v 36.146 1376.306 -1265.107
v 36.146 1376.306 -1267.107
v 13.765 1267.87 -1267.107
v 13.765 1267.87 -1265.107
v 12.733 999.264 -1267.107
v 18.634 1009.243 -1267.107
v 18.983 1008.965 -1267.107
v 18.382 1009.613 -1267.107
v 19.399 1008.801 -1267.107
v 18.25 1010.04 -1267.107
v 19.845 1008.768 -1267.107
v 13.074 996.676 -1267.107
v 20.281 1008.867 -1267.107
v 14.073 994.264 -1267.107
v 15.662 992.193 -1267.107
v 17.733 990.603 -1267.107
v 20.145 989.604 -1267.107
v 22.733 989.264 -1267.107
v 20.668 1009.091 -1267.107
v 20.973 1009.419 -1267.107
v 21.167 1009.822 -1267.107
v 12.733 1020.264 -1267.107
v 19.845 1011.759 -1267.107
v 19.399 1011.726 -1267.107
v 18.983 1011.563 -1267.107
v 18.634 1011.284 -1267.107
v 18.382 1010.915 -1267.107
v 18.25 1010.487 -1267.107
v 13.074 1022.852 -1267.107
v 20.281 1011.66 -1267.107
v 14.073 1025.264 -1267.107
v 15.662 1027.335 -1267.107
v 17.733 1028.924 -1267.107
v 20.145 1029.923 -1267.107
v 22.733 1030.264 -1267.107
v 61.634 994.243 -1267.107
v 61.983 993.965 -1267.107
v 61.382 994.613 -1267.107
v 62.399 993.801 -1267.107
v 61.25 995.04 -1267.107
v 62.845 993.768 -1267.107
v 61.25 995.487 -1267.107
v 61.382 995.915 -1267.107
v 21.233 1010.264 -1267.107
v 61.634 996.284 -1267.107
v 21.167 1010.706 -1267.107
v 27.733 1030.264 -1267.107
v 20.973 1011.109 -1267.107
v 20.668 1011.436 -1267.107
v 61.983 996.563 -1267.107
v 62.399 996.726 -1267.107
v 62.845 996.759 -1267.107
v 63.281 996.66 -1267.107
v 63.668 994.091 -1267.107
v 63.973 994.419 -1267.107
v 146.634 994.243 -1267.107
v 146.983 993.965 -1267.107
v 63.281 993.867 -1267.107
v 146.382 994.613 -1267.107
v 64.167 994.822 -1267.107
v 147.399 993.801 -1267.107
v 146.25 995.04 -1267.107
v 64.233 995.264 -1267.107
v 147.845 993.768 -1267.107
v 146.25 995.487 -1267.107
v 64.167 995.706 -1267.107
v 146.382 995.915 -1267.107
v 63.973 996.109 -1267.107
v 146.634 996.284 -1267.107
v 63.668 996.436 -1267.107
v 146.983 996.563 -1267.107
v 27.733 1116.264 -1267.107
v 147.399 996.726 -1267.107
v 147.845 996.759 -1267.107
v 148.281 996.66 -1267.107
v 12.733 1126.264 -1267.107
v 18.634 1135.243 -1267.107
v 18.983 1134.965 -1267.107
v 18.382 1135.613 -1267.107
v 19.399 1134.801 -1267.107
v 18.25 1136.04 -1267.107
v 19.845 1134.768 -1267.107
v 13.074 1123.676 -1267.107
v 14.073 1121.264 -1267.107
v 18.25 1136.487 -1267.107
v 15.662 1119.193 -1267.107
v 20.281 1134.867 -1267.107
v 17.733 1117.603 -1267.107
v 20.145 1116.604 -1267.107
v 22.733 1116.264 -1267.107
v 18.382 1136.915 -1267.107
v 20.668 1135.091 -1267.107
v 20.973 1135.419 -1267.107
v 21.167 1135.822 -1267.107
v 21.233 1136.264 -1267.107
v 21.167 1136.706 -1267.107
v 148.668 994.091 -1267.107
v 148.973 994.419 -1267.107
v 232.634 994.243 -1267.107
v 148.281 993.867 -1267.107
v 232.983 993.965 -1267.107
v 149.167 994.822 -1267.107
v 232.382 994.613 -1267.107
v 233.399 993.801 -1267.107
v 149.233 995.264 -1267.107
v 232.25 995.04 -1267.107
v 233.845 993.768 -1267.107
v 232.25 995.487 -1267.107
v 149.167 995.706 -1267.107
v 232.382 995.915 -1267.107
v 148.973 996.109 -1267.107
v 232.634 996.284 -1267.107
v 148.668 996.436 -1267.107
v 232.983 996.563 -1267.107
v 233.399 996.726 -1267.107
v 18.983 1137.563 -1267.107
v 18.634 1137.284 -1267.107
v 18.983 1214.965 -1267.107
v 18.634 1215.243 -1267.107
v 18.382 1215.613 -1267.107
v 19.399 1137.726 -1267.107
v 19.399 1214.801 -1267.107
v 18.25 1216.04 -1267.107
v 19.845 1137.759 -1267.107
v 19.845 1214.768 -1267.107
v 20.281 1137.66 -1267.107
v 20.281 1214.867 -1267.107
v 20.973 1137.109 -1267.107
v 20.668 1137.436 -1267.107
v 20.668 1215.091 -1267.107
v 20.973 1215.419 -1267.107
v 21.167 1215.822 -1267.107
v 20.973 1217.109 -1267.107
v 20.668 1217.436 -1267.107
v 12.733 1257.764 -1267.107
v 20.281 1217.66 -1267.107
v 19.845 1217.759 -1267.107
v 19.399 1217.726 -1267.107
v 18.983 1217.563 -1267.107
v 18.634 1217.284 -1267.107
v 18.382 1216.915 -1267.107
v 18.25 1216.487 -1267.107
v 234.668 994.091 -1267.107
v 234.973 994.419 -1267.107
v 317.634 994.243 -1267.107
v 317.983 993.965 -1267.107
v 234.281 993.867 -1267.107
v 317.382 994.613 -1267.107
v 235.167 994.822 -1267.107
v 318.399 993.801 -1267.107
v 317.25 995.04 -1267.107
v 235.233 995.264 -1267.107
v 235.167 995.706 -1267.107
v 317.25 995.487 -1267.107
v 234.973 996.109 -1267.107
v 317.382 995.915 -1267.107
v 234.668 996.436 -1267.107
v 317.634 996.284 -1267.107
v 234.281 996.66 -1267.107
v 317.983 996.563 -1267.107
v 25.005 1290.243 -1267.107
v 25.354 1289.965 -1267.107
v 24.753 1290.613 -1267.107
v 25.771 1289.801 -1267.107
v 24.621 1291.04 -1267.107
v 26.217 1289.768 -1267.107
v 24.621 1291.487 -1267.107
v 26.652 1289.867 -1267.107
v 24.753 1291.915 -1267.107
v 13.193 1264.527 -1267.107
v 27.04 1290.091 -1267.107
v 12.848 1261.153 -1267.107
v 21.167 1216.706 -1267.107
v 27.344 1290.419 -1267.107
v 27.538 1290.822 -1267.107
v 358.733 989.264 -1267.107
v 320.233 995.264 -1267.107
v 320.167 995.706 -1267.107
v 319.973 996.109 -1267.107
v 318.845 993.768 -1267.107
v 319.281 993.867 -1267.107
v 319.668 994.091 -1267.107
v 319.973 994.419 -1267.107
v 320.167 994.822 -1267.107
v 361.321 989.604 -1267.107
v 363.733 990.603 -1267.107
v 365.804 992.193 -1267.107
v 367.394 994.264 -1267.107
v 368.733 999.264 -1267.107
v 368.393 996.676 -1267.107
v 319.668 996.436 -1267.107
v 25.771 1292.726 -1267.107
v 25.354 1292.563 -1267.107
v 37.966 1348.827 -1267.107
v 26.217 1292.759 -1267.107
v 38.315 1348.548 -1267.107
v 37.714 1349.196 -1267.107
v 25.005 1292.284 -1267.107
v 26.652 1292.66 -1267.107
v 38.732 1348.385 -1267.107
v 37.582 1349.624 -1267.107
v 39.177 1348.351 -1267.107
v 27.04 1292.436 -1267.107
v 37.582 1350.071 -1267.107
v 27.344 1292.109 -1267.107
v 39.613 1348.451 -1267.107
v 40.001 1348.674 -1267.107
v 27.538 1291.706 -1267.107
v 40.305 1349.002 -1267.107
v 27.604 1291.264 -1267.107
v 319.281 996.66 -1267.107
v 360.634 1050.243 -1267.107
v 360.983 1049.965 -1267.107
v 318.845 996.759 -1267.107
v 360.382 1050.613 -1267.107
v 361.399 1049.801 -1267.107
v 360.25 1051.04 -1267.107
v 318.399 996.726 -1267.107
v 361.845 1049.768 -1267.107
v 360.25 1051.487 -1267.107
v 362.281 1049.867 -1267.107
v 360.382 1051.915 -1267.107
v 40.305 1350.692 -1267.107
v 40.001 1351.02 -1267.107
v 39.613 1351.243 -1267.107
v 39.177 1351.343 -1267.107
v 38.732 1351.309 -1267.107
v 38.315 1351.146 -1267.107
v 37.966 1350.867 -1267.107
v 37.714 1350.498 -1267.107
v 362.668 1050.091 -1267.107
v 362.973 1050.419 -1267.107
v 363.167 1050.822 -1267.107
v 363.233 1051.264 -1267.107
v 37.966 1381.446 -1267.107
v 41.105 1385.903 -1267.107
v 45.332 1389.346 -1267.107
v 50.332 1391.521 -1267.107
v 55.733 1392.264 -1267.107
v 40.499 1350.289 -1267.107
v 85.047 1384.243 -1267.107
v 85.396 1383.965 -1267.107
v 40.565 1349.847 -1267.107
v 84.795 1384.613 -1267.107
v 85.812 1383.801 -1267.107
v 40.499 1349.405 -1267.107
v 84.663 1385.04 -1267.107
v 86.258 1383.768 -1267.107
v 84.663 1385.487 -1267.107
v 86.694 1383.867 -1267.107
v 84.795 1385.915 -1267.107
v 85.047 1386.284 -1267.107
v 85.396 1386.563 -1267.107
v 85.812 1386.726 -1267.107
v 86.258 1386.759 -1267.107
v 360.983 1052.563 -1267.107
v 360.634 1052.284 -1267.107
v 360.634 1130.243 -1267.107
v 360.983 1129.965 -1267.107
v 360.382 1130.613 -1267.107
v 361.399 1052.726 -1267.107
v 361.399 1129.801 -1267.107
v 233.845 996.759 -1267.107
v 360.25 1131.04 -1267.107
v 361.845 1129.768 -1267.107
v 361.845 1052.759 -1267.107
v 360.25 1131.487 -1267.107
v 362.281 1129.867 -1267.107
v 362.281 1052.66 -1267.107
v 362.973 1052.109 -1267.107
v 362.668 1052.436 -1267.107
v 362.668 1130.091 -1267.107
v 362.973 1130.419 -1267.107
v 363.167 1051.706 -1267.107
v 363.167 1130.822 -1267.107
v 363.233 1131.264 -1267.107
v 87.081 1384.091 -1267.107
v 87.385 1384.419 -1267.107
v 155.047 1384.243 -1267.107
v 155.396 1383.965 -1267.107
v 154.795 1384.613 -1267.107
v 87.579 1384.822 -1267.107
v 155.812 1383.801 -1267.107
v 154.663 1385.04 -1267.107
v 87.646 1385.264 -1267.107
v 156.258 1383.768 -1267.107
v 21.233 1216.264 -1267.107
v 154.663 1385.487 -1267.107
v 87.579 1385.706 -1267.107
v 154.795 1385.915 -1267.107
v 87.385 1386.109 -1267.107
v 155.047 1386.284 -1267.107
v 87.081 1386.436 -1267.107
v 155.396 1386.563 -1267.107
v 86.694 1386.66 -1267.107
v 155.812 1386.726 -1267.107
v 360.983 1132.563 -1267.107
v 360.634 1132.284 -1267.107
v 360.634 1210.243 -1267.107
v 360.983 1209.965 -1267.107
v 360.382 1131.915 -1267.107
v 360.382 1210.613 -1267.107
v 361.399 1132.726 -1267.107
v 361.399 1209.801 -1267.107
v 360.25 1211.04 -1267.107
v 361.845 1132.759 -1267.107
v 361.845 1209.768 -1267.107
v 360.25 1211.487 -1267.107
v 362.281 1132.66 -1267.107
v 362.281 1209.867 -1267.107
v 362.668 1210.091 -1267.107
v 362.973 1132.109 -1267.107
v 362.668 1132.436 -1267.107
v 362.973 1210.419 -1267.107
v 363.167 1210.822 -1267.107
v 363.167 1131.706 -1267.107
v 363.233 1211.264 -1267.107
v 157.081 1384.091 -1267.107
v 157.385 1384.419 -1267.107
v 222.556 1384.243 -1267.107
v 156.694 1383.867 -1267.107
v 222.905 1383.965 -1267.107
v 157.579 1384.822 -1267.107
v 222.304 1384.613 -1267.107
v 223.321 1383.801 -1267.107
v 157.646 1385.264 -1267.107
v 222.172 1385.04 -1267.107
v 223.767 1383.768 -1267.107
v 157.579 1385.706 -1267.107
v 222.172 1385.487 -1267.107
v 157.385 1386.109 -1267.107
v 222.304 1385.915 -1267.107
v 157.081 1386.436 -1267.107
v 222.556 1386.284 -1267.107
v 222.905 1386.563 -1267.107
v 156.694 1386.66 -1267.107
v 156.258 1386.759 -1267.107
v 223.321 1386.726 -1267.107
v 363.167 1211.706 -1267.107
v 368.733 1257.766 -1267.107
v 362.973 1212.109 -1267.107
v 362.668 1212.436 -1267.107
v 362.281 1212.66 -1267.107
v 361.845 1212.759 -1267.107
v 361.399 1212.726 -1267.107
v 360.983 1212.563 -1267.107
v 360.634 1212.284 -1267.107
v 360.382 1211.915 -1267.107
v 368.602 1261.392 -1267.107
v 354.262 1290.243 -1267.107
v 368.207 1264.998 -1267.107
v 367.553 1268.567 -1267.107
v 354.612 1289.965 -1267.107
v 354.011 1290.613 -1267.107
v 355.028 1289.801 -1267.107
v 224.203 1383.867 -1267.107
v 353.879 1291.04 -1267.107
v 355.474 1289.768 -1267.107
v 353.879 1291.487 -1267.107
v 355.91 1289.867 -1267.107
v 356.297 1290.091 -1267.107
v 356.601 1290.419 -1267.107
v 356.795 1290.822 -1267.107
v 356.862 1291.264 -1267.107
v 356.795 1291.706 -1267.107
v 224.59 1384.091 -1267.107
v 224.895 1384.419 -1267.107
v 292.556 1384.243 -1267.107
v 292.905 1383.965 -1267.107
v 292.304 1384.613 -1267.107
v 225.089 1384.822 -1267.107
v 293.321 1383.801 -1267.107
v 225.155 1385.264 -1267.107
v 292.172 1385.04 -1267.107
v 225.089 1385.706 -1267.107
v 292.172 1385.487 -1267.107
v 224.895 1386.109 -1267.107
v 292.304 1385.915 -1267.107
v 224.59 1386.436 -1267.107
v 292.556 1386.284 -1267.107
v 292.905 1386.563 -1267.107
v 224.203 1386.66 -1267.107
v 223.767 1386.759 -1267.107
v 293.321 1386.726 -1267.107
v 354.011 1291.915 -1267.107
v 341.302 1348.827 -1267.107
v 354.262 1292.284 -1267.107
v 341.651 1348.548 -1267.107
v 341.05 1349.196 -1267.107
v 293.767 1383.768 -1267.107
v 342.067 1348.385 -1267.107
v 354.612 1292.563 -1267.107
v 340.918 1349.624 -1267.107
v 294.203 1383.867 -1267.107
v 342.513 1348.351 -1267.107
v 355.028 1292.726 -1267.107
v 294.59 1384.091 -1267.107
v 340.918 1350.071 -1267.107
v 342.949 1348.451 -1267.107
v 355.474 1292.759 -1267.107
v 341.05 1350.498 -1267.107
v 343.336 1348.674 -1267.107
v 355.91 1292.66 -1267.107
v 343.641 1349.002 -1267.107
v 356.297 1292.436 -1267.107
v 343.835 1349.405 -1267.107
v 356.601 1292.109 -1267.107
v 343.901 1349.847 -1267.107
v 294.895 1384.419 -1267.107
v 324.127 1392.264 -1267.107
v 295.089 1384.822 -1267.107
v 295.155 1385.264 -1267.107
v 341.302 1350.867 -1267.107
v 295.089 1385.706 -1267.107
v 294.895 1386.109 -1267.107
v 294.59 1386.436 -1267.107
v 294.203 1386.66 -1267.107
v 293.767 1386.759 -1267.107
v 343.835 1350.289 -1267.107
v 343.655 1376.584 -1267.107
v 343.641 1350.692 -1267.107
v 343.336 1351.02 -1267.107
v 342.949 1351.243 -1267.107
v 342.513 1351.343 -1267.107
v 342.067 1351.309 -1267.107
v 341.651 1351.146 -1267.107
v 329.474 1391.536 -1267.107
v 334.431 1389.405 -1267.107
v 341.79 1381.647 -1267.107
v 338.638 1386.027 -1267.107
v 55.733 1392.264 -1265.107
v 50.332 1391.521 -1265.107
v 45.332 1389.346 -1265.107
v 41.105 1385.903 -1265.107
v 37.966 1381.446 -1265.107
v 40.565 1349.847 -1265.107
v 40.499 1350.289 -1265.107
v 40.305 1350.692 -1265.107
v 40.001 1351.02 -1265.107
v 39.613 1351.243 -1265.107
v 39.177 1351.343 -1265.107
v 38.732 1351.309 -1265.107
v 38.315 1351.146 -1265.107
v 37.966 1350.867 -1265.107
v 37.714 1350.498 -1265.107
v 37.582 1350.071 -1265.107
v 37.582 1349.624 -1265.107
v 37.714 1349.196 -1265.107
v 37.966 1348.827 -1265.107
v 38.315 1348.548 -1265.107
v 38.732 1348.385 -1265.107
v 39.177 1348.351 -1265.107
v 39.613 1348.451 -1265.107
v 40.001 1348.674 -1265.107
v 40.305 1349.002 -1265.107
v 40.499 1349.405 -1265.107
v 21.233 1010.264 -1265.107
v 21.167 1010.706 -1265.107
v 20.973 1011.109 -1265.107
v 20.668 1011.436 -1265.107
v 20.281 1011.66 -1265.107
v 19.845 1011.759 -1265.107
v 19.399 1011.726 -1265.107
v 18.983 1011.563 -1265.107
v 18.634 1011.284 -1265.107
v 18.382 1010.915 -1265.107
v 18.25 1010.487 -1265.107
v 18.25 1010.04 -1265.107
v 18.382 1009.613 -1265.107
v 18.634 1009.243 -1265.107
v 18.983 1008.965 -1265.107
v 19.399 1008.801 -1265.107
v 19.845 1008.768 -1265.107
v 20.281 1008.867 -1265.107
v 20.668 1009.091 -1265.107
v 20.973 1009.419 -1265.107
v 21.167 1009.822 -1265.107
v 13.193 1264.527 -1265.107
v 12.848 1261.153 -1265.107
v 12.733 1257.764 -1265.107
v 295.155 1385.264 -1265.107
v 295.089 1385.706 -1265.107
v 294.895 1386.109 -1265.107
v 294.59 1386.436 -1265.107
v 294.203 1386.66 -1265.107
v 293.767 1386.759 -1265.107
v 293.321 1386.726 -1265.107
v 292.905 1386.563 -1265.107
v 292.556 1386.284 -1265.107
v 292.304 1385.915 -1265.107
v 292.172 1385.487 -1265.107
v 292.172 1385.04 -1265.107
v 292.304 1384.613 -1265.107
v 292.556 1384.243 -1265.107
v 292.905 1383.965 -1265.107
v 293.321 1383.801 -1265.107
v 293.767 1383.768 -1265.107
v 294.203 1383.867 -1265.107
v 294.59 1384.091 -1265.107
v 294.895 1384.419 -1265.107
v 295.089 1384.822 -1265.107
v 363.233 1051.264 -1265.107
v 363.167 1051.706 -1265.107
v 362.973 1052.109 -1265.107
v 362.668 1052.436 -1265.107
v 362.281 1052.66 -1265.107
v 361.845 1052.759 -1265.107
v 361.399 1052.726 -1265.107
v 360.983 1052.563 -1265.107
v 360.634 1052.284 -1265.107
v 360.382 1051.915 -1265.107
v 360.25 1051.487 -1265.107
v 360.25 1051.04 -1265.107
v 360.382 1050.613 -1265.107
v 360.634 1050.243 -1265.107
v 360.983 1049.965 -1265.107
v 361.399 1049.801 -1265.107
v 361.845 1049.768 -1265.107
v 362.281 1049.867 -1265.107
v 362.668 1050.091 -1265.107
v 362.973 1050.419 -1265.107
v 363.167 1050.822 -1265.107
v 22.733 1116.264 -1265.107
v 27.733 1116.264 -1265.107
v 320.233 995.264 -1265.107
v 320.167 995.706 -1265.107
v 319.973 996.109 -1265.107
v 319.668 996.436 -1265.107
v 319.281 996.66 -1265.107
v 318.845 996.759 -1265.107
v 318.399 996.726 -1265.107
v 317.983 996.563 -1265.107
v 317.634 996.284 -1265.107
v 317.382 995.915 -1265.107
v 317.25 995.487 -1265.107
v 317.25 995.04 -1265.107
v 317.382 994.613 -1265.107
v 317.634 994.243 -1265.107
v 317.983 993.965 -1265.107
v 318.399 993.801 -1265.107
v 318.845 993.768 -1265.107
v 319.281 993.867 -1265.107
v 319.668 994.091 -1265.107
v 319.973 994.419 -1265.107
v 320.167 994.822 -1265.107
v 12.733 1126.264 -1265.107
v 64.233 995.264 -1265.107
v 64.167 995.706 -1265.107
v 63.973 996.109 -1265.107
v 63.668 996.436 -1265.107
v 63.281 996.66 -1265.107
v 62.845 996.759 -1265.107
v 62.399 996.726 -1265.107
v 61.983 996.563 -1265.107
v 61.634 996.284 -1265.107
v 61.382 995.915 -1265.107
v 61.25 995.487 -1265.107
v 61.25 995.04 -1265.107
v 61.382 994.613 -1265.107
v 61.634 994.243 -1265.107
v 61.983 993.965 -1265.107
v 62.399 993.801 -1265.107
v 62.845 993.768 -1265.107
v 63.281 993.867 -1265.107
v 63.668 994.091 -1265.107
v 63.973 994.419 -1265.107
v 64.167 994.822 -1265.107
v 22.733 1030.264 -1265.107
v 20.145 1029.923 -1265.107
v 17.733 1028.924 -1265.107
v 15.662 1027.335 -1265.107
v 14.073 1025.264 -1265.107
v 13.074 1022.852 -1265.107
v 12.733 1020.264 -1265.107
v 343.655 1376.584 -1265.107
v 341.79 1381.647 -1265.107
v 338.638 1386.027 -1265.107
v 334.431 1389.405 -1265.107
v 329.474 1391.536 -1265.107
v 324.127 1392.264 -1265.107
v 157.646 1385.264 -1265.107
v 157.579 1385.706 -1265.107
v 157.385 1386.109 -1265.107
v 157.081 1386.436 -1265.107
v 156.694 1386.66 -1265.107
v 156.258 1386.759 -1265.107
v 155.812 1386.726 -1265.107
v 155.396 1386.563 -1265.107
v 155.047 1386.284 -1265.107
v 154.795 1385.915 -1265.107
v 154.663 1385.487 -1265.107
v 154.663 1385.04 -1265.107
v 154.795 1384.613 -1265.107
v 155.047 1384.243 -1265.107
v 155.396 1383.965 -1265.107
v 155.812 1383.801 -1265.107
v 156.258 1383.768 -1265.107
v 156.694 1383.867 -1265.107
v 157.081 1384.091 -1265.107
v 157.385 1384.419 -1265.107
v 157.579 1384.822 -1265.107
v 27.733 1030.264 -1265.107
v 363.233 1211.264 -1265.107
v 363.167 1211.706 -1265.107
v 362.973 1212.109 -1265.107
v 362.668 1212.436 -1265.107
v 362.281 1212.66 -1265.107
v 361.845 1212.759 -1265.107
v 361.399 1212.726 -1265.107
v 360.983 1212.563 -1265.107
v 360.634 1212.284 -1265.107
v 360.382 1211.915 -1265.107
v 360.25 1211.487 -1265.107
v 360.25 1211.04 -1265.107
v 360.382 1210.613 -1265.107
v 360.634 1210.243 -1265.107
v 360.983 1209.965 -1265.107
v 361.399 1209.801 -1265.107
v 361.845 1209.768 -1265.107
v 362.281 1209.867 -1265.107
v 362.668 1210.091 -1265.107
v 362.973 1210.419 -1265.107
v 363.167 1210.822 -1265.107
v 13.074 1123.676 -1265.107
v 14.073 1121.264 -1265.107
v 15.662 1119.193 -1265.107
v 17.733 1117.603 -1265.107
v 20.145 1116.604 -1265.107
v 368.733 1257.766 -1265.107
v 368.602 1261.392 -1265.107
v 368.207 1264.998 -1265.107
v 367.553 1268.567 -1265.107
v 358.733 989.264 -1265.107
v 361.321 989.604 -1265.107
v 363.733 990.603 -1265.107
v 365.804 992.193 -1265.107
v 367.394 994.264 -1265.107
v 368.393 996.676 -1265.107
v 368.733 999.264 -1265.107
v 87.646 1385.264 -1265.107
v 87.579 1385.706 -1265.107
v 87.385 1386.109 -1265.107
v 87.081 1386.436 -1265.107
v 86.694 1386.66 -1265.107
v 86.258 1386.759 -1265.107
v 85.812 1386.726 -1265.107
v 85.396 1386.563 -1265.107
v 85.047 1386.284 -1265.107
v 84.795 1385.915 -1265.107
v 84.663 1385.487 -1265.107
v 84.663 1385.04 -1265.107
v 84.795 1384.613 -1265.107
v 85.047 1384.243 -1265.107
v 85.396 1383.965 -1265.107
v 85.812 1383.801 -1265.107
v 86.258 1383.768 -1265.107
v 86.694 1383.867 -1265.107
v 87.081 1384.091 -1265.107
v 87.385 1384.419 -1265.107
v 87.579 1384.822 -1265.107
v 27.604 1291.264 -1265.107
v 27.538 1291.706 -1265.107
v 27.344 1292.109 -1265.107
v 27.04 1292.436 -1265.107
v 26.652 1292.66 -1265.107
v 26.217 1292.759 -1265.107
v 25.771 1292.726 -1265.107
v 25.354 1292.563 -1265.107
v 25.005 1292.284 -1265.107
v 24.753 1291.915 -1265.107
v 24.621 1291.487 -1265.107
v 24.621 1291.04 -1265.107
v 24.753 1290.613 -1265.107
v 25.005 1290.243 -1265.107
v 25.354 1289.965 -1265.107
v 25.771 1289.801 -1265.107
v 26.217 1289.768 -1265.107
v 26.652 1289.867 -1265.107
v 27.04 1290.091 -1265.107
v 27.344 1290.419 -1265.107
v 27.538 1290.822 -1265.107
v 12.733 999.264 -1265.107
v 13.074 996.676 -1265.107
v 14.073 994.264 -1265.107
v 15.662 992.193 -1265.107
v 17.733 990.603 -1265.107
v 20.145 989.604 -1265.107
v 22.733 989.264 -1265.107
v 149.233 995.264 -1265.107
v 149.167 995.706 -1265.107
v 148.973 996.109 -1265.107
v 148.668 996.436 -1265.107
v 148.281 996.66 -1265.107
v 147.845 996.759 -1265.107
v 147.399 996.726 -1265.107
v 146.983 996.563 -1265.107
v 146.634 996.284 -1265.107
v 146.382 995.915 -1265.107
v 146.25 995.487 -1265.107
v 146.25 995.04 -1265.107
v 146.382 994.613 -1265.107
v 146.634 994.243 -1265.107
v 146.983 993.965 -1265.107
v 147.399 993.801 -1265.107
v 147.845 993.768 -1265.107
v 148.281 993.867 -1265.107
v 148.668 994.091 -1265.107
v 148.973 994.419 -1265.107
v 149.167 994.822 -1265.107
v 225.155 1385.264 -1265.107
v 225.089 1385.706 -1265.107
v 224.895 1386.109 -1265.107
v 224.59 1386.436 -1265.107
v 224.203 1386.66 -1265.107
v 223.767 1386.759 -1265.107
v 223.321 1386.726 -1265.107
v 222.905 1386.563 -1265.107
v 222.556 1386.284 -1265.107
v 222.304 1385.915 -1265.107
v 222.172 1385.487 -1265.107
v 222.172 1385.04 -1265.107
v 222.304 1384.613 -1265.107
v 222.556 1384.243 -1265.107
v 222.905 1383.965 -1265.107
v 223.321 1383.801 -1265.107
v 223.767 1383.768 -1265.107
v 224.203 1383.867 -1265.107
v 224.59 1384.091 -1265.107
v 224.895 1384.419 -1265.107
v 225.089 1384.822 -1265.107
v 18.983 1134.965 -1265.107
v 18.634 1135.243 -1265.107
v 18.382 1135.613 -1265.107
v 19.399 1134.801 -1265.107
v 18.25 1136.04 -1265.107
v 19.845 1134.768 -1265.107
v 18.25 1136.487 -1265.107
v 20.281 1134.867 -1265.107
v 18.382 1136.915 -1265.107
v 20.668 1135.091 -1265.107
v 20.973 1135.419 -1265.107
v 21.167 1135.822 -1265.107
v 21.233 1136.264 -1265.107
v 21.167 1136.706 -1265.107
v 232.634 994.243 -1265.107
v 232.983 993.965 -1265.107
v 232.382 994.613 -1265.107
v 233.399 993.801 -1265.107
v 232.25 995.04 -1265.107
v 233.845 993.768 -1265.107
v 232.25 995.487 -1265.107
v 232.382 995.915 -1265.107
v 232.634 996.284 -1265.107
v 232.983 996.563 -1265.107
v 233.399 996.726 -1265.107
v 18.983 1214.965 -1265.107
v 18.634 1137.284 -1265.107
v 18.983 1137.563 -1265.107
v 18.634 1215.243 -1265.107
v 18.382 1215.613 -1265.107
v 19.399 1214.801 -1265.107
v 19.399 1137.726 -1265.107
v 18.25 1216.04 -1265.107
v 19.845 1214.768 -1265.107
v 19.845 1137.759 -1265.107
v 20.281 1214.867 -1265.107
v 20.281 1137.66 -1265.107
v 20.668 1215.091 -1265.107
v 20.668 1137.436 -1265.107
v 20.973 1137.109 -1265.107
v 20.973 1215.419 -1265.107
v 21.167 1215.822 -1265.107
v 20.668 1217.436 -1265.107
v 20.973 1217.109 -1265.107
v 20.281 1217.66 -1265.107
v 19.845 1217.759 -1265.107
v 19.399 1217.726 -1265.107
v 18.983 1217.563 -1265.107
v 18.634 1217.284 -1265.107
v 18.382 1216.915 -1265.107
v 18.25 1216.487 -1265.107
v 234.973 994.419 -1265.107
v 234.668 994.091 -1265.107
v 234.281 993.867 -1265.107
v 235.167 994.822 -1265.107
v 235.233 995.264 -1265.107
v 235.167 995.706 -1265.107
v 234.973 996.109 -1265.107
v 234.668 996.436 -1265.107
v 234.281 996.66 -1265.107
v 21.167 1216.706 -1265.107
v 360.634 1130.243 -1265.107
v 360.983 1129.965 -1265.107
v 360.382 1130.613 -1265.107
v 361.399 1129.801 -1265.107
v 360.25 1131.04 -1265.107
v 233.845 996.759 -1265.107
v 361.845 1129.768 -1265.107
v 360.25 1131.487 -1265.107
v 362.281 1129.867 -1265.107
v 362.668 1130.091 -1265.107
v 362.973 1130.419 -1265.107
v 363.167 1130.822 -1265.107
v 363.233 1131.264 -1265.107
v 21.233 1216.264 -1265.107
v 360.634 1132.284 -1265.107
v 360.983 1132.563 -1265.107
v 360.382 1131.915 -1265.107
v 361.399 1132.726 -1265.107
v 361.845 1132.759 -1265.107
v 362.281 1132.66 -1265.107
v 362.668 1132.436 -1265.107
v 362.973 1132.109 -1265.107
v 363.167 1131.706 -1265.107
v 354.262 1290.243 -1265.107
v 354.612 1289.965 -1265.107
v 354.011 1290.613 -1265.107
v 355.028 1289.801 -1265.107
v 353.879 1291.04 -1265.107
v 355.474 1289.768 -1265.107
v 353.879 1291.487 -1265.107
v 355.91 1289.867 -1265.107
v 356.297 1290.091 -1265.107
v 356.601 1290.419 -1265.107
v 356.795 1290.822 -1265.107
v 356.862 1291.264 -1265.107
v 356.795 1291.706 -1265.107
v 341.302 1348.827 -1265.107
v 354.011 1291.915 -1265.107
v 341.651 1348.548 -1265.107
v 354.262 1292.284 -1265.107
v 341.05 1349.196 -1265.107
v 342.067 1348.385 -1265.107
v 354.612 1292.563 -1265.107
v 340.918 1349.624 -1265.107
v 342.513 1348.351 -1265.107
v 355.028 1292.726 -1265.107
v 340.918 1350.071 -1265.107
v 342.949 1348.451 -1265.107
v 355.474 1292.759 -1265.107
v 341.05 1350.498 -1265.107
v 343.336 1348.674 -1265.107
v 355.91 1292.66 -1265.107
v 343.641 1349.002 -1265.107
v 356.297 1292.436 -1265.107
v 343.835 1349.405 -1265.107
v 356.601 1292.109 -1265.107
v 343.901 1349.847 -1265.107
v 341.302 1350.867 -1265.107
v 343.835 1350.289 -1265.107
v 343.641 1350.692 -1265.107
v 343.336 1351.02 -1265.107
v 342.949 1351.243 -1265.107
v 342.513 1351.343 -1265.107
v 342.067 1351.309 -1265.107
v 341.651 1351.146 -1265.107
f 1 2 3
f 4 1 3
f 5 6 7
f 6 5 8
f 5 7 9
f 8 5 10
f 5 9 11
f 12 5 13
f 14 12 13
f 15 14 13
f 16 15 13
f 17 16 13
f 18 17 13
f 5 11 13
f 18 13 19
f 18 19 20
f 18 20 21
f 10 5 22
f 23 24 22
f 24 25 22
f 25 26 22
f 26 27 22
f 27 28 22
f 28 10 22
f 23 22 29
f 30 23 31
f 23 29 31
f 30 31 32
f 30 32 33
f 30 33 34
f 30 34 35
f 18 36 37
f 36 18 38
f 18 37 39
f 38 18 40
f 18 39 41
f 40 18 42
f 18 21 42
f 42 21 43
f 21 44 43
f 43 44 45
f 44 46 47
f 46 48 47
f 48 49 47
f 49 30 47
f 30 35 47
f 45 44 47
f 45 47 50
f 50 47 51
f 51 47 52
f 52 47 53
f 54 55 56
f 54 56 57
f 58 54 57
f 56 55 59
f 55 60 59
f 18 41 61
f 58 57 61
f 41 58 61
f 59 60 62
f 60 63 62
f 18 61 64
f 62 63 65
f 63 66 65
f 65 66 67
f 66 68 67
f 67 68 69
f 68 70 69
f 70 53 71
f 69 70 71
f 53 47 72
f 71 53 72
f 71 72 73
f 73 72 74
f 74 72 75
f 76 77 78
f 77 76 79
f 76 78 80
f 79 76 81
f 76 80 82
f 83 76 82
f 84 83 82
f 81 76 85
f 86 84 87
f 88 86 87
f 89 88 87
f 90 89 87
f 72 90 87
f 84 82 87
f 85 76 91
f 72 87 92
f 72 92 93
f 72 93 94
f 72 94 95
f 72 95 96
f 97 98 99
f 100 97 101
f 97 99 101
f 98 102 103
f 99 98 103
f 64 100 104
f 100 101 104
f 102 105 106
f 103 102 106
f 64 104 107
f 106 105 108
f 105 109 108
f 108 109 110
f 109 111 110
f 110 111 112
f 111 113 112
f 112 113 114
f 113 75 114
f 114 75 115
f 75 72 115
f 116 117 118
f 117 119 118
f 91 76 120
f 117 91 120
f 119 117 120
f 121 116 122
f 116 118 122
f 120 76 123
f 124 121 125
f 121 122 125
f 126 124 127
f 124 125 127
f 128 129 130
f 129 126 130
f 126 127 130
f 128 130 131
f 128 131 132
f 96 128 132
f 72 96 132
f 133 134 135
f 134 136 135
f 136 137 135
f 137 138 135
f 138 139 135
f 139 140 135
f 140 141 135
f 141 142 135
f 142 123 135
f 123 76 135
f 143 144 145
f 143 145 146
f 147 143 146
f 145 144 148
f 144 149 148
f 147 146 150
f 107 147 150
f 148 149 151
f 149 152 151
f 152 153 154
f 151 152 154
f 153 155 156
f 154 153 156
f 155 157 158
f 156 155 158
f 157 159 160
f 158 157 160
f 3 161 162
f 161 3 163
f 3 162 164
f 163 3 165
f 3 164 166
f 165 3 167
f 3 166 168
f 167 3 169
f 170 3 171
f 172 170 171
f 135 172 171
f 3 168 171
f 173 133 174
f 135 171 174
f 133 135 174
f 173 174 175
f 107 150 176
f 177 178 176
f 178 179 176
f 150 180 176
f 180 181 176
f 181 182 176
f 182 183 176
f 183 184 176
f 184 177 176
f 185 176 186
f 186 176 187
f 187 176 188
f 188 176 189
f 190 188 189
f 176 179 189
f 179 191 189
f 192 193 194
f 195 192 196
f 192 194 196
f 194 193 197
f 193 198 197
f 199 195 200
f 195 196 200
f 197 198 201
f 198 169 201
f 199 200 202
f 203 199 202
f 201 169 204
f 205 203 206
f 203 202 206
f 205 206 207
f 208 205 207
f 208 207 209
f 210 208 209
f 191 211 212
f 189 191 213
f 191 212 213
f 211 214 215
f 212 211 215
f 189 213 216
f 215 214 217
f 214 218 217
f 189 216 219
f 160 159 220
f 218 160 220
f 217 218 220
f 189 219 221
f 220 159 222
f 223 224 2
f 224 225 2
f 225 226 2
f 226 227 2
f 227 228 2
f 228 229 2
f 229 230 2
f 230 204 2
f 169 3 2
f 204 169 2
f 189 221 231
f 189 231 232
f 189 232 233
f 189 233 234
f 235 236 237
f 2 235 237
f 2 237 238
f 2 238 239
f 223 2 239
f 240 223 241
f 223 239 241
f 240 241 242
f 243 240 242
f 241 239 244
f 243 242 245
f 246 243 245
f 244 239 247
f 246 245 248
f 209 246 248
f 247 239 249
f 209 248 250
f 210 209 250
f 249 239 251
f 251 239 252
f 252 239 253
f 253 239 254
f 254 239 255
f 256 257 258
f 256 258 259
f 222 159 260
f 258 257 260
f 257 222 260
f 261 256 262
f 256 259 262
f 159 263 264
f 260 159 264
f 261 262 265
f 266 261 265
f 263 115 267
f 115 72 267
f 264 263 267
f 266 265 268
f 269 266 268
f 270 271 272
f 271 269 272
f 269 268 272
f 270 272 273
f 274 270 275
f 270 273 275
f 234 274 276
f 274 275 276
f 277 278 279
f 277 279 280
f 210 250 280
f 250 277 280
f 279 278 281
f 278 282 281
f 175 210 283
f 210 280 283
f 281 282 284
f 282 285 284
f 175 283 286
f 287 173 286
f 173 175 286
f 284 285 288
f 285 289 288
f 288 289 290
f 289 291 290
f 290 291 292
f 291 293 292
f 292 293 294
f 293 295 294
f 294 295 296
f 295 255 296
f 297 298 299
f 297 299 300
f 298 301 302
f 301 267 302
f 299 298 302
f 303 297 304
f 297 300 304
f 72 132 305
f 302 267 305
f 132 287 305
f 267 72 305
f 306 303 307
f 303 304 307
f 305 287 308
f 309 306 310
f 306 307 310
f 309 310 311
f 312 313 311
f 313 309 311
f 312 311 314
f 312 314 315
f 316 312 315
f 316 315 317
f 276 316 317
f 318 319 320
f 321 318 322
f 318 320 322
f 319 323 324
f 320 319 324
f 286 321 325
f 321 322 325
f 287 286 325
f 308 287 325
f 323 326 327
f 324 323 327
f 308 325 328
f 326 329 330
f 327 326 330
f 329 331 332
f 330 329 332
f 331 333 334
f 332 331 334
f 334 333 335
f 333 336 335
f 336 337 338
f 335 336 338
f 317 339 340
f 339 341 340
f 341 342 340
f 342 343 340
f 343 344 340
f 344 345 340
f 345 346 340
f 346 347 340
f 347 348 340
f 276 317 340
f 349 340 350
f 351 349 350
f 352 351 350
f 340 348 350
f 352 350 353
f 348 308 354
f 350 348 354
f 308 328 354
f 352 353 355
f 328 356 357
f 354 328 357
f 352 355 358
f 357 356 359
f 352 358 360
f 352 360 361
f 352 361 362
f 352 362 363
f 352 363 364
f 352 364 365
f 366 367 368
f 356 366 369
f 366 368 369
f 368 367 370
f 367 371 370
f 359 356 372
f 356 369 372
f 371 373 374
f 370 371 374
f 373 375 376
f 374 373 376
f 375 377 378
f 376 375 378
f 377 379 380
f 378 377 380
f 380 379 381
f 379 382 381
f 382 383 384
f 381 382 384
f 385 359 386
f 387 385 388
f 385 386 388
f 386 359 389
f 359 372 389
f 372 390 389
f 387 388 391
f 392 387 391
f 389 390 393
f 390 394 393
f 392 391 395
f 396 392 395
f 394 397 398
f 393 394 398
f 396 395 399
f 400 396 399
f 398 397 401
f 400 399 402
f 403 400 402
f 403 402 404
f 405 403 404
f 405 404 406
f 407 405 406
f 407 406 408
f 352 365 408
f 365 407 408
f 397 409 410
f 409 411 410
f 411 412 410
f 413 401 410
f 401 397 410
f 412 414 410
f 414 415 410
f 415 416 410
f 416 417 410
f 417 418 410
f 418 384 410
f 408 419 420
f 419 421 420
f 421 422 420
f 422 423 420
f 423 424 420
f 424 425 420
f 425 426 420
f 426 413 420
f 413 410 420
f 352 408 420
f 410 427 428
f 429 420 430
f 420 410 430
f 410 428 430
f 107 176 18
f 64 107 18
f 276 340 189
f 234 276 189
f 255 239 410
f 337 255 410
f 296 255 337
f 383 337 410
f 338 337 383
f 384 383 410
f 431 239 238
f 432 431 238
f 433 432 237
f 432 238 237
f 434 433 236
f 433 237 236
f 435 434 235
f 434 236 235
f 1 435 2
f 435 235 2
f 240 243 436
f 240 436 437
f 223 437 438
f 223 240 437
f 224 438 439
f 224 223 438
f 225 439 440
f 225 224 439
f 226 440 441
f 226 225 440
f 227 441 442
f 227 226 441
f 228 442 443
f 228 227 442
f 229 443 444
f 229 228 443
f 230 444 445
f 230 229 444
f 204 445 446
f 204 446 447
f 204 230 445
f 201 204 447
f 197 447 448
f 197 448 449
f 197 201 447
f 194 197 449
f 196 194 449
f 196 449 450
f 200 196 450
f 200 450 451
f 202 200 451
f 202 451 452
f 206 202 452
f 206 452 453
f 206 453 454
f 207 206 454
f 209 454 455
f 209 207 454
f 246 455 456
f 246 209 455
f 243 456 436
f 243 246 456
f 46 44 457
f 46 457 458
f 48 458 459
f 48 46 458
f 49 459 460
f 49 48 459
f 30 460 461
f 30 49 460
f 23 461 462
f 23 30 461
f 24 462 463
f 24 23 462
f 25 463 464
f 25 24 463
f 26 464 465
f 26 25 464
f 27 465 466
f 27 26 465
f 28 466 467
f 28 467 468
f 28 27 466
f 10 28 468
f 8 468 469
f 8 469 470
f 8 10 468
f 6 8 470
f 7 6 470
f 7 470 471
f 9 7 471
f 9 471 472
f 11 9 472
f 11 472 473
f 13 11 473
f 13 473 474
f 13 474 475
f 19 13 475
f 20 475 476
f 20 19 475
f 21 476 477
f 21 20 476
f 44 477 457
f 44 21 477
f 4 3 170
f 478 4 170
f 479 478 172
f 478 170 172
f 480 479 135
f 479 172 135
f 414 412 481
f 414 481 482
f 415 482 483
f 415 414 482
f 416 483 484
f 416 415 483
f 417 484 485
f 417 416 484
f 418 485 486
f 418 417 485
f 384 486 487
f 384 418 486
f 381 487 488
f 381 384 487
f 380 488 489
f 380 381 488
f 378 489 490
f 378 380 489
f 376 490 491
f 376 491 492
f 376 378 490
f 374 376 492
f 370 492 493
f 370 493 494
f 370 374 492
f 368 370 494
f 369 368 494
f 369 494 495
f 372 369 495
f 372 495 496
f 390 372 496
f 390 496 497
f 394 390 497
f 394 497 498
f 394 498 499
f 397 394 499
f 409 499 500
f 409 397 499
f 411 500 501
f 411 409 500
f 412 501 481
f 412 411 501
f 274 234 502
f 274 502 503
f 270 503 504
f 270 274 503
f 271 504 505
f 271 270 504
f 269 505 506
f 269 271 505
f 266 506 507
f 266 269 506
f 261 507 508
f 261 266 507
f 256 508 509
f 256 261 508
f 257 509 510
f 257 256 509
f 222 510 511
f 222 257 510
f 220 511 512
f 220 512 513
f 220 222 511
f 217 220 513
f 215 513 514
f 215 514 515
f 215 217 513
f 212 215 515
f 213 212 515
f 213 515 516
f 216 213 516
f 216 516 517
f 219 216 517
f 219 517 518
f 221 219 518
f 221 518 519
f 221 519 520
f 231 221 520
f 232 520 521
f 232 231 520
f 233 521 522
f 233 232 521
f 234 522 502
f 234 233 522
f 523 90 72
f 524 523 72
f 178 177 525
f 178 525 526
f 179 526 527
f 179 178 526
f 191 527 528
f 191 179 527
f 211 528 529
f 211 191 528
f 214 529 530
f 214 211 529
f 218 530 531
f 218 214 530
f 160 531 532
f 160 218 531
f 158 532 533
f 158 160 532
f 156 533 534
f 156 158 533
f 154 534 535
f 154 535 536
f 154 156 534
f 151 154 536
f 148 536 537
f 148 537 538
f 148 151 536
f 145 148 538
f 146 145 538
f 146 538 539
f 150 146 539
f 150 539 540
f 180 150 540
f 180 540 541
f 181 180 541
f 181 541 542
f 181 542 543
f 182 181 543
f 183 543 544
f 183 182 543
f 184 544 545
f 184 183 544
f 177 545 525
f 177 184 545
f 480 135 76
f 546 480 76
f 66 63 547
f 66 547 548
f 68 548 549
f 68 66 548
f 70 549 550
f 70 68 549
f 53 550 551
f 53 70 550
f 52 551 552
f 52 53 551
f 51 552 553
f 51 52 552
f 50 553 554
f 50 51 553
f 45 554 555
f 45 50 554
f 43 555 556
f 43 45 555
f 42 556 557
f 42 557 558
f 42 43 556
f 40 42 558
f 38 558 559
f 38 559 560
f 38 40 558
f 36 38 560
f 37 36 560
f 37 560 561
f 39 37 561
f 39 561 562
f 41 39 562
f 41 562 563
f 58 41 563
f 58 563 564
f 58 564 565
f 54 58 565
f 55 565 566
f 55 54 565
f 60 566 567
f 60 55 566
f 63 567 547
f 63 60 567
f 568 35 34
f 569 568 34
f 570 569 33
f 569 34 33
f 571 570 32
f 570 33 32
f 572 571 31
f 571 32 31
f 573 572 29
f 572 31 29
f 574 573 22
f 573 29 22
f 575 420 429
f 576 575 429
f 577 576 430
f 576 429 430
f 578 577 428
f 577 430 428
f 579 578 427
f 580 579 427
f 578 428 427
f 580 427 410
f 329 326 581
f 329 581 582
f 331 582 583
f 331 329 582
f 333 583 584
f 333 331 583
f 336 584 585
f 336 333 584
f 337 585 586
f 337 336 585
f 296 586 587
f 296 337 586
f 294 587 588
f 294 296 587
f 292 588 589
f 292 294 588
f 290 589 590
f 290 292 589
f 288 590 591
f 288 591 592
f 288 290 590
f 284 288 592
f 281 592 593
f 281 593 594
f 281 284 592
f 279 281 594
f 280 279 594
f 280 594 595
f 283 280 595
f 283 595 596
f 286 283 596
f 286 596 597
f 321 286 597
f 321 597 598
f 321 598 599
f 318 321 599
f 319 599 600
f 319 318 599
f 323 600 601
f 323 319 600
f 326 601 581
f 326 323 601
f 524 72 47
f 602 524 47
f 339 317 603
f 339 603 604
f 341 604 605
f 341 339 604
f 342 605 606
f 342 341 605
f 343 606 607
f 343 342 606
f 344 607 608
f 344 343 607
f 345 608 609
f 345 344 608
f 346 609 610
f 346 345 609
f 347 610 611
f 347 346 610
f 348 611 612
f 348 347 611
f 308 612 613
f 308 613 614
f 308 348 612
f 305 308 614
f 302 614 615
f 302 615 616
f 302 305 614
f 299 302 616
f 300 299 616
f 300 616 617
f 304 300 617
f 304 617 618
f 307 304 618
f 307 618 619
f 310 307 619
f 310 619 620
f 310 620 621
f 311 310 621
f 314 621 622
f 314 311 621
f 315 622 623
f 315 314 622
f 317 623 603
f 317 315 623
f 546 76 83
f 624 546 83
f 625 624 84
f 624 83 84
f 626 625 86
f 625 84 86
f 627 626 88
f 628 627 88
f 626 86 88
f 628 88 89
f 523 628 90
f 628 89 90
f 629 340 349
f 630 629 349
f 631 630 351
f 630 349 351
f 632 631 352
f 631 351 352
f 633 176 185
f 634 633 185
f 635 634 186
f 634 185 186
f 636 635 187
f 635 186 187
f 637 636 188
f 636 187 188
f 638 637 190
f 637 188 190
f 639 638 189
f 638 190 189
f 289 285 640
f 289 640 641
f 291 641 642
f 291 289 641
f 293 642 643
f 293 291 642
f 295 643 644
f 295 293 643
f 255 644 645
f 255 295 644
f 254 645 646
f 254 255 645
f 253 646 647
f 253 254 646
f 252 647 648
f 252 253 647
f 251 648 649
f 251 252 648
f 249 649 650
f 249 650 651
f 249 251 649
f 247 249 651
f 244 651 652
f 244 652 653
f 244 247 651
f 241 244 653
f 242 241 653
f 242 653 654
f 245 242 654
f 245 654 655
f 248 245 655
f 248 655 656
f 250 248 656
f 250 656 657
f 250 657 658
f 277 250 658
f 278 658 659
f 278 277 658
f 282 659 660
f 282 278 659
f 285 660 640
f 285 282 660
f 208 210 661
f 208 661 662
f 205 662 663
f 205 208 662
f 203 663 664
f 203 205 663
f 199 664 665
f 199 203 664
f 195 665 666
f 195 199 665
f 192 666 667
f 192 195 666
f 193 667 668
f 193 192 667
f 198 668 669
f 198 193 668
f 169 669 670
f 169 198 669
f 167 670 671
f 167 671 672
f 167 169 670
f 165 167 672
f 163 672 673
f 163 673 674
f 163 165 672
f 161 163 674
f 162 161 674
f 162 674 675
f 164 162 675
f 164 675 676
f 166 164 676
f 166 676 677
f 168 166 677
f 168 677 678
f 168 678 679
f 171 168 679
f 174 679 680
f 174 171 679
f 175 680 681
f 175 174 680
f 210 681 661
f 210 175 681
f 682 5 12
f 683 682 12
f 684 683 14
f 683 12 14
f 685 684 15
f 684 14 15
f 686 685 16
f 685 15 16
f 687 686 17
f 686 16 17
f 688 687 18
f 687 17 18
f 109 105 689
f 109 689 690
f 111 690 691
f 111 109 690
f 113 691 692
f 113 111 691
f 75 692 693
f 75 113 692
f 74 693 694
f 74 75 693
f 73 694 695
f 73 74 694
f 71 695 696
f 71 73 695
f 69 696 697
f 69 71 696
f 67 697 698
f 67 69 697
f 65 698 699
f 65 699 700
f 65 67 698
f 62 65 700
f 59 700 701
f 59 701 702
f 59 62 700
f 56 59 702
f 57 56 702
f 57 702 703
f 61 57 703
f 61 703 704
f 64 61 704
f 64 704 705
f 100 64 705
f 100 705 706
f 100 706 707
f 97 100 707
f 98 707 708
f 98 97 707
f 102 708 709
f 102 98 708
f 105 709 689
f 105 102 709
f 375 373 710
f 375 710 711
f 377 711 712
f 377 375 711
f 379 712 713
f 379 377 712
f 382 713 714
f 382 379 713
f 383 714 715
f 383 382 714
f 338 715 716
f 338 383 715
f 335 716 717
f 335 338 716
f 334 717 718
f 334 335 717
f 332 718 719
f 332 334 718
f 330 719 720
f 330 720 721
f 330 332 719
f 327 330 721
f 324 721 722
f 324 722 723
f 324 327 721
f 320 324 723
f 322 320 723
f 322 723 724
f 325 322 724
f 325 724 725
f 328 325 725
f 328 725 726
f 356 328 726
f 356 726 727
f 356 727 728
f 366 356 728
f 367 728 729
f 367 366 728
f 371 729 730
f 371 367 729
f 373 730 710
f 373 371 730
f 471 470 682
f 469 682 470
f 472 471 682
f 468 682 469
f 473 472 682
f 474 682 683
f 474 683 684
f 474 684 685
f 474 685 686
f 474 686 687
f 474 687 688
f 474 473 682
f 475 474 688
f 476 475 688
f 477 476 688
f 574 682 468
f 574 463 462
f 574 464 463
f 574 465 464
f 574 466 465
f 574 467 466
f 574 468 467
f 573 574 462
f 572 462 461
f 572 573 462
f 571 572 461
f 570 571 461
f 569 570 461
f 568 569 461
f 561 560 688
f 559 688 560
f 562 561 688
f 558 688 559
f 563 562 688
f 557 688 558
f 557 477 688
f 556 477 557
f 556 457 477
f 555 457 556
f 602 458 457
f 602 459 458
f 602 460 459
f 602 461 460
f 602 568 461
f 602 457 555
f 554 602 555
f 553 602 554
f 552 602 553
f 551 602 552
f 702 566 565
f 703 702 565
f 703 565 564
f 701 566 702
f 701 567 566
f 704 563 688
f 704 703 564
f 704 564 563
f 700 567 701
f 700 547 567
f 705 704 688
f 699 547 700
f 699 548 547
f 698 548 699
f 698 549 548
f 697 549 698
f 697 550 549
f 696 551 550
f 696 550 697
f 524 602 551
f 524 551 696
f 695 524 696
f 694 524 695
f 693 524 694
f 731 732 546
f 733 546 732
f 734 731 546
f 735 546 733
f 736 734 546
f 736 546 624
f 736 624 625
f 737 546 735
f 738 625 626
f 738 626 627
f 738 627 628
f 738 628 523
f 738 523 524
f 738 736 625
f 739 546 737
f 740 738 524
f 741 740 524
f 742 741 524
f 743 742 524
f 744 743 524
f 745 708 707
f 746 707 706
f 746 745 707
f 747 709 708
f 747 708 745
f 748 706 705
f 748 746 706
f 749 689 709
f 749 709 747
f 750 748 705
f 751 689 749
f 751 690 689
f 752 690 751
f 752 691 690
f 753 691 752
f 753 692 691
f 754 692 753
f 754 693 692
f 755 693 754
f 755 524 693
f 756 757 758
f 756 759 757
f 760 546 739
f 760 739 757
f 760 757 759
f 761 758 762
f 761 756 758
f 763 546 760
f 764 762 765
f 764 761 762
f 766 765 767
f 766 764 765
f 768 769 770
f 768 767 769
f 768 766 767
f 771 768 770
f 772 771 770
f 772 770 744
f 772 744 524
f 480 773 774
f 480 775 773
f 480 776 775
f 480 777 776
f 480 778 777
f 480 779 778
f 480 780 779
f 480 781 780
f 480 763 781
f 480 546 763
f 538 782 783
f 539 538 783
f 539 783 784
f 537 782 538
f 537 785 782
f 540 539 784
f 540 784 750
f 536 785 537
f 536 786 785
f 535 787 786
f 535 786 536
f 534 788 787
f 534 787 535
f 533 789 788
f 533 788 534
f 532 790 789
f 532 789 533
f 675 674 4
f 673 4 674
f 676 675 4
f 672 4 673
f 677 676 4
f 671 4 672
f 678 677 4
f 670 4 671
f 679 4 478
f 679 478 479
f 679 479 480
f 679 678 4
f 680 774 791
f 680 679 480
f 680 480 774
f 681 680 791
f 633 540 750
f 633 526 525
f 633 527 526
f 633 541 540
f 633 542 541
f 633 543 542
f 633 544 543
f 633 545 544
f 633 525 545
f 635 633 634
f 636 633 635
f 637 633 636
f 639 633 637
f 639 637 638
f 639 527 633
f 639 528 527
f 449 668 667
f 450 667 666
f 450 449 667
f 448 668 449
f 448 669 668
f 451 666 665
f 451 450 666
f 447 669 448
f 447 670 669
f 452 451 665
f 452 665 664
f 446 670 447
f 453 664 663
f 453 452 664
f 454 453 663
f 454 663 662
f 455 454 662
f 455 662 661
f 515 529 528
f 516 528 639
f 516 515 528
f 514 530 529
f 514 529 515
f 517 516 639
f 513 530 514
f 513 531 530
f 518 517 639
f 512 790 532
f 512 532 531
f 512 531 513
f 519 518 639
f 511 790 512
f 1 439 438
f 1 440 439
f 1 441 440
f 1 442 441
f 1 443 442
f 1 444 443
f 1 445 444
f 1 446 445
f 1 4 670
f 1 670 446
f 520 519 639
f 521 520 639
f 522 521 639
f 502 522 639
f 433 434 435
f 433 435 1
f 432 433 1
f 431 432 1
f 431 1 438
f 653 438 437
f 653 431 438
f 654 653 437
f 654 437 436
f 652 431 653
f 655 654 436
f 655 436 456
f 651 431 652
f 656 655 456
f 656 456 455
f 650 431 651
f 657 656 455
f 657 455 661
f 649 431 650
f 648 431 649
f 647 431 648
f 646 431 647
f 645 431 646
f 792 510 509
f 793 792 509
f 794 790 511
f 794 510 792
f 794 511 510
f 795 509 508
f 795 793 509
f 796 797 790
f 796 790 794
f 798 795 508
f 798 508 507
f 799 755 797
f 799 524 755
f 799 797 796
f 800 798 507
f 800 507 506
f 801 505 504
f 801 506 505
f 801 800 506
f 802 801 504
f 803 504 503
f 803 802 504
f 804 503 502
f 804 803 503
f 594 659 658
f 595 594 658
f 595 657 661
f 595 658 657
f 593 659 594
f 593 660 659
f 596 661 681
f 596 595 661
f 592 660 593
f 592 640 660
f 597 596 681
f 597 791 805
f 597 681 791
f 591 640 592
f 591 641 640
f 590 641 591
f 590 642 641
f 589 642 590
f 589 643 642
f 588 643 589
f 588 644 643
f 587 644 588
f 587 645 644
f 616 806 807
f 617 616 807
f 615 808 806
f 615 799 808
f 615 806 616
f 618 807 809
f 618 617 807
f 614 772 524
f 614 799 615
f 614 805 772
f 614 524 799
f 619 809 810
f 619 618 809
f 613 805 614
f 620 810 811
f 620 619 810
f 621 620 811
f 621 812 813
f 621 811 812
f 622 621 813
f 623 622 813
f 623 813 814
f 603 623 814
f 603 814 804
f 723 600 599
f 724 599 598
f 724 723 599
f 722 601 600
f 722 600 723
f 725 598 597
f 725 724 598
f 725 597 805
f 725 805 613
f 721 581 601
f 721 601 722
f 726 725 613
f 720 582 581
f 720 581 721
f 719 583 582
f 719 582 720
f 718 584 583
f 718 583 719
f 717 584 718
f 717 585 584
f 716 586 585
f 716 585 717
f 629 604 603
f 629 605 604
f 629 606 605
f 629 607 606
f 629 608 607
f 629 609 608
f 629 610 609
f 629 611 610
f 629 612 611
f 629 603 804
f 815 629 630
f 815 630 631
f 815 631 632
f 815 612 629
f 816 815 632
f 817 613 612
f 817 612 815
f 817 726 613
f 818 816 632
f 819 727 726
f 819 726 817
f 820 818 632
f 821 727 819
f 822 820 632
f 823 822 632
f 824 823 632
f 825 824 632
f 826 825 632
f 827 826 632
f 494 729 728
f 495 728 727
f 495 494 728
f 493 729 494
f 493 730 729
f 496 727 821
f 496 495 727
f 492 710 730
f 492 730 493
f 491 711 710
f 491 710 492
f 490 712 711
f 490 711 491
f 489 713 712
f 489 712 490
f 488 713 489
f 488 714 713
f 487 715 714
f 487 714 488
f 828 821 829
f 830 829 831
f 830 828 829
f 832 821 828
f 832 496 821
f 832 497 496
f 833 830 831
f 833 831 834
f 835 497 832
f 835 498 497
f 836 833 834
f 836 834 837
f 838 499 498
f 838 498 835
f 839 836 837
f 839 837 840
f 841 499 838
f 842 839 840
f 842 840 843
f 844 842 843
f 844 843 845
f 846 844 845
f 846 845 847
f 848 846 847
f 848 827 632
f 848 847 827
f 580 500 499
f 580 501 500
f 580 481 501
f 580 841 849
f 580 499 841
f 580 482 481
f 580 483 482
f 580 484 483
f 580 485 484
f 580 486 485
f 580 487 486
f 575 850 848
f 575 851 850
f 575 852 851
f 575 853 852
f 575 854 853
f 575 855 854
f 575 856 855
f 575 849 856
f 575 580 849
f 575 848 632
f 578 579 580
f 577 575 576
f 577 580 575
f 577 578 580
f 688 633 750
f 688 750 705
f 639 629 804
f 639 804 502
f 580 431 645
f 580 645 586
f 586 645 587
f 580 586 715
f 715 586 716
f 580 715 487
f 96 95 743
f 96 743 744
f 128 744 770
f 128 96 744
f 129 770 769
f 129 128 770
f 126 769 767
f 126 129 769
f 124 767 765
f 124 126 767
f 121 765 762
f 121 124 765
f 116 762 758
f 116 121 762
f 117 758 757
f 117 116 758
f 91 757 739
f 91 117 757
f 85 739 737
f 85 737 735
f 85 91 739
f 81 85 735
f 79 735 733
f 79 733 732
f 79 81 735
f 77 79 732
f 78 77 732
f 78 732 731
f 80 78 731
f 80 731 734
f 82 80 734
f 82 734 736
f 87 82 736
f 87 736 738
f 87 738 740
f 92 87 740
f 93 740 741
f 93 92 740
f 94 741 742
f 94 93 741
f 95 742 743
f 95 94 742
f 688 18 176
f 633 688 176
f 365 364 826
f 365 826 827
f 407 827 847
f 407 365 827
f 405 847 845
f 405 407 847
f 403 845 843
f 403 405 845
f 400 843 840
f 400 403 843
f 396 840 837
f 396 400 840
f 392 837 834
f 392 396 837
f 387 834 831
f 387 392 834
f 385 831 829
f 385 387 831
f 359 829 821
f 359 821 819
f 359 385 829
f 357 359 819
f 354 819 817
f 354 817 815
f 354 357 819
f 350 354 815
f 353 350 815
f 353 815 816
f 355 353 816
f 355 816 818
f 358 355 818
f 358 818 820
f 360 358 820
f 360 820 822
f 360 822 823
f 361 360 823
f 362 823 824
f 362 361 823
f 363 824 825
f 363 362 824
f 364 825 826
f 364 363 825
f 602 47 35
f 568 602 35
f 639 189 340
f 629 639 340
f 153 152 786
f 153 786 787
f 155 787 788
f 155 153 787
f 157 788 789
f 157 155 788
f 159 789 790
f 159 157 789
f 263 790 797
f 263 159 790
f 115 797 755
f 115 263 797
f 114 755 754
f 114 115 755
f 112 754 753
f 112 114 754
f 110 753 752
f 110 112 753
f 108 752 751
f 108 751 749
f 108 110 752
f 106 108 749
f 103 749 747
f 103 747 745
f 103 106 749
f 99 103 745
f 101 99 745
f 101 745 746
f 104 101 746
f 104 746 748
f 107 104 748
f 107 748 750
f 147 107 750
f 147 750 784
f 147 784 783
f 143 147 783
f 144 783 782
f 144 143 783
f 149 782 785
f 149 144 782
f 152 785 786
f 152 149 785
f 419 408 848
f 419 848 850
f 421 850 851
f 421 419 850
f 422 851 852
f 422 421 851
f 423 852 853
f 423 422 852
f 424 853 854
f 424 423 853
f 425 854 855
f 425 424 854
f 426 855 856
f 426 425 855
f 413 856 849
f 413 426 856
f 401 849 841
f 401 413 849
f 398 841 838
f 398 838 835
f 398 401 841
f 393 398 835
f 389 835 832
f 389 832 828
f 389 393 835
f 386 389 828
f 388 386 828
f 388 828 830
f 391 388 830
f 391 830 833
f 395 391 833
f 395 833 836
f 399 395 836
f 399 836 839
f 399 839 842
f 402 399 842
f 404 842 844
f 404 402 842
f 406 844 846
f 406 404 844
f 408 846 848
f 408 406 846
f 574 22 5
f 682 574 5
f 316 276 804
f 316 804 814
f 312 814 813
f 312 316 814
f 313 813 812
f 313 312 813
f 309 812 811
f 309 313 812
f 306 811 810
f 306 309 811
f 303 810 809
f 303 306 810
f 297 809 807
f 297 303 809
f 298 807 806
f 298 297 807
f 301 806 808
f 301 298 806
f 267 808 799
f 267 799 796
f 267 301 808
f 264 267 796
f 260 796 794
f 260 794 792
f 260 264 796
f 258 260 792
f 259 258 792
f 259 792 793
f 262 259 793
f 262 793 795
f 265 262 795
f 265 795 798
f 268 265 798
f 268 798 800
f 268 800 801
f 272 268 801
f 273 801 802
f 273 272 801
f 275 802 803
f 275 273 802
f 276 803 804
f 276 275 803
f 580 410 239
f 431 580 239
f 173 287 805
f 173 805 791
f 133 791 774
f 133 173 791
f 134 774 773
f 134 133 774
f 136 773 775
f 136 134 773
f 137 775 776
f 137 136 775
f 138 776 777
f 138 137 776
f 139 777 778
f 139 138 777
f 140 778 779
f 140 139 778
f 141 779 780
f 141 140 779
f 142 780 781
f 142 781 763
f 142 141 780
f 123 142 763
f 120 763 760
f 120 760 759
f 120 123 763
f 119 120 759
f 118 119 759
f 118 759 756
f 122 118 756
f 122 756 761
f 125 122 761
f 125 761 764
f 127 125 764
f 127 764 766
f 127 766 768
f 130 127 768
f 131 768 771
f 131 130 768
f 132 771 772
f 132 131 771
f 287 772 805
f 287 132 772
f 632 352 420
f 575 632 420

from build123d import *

# Parameters (mm, degrees)
SKETCH1_R           = 1.5
BOSS_EXTRUDE1_DEPTH = 2


with BuildPart() as part:
    # Sketch1 → Boss-Extrude1 (new body)
    with BuildSketch(Plane.XY.offset(-1267.107479839)):
        with BuildLine():
            Line((36.146099055, 1376.306398419), (13.765371143, 1267.870458722))
            ThreePointArc((13.765371143, 1267.870458722), (12.991950286, 1262.843357254), (12.733250996, 1257.763691551))
            Line((12.733250996, 1257.763691551), (12.733250996, 1126.263691551))
            ThreePointArc((12.733250996, 1126.263691551), (15.662183185, 1119.192623739), (22.733250996, 1116.263691551))
            Line((22.733250996, 1116.263691551), (27.733250996, 1116.263691551))
            Line((27.733250996, 1116.263691551), (27.733250996, 1030.263691551))
            Line((27.733250996, 1030.263691551), (22.733250996, 1030.263691551))
            ThreePointArc((22.733250996, 1030.263691551), (15.662183185, 1027.334759363), (12.733250996, 1020.263691551))
            Line((12.733250996, 1020.263691551), (12.733250996, 999.263691551))
            ThreePointArc((12.733250996, 999.263691551), (15.662183185, 992.192623739), (22.733250996, 989.263691551))
            Line((22.733250996, 989.263691551), (358.733250996, 989.263691551))
            ThreePointArc((358.733250996, 989.263691551), (365.804318808, 992.192623739), (368.733250996, 999.263691551))
            Line((368.733250996, 999.263691551), (368.733250996, 1257.766155457))
            ThreePointArc((368.733250996, 1257.766155457), (368.437249077, 1263.198703185), (367.552748004, 1268.566929131))
            Line((367.552748004, 1268.566929131), (343.655165727, 1376.584001021))
            ThreePointArc((343.655165727, 1376.584001021), (336.649224027, 1387.858661724), (324.127366924, 1392.263691551))
            Line((324.127366924, 1392.263691551), (55.733250996, 1392.263691551))
            ThreePointArc((55.733250996, 1392.263691551), (43.101033008, 1387.769402392), (36.146099055, 1376.306398419))
        make_face()
        with Locations((19.733250996, 1010.263691551)):
            Circle(SKETCH1_R, mode=Mode.SUBTRACT)
        with Locations((62.733250996, 995.263691551)):
            Circle(SKETCH1_R, mode=Mode.SUBTRACT)
        with Locations((147.733250996, 995.263691551)):
            Circle(SKETCH1_R, mode=Mode.SUBTRACT)
        with Locations((233.733250996, 995.263691551)):
            Circle(SKETCH1_R, mode=Mode.SUBTRACT)
        with Locations((318.733250996, 995.263691551)):
            Circle(SKETCH1_R, mode=Mode.SUBTRACT)
        with Locations((361.733250996, 1051.263691551)):
            Circle(SKETCH1_R, mode=Mode.SUBTRACT)
        with Locations((361.733250996, 1131.263691551)):
            Circle(SKETCH1_R, mode=Mode.SUBTRACT)
        with Locations((361.733250996, 1211.263691551)):
            Circle(SKETCH1_R, mode=Mode.SUBTRACT)
        with Locations((355.36207357, 1291.263691551)):
            Circle(SKETCH1_R, mode=Mode.SUBTRACT)
        with Locations((342.401145161, 1349.84708796)):
            Circle(SKETCH1_R, mode=Mode.SUBTRACT)
        with Locations((293.655165727, 1385.263691551)):
            Circle(SKETCH1_R, mode=Mode.SUBTRACT)
        with Locations((223.655165727, 1385.263691551)):
            Circle(SKETCH1_R, mode=Mode.SUBTRACT)
        with Locations((156.146099055, 1385.263691551)):
            Circle(SKETCH1_R, mode=Mode.SUBTRACT)
        with Locations((86.146099055, 1385.263691551)):
            Circle(SKETCH1_R, mode=Mode.SUBTRACT)
        with Locations((39.065356832, 1349.84708796)):
            Circle(SKETCH1_R, mode=Mode.SUBTRACT)
        with Locations((26.104428423, 1291.263691551)):
            Circle(SKETCH1_R, mode=Mode.SUBTRACT)
        with Locations((19.733250996, 1216.263691551)):
            Circle(SKETCH1_R, mode=Mode.SUBTRACT)
        with Locations((19.733250996, 1136.263691551)):
            Circle(SKETCH1_R, mode=Mode.SUBTRACT)
    extrude(amount=BOSS_EXTRUDE1_DEPTH)


solid = part.part
